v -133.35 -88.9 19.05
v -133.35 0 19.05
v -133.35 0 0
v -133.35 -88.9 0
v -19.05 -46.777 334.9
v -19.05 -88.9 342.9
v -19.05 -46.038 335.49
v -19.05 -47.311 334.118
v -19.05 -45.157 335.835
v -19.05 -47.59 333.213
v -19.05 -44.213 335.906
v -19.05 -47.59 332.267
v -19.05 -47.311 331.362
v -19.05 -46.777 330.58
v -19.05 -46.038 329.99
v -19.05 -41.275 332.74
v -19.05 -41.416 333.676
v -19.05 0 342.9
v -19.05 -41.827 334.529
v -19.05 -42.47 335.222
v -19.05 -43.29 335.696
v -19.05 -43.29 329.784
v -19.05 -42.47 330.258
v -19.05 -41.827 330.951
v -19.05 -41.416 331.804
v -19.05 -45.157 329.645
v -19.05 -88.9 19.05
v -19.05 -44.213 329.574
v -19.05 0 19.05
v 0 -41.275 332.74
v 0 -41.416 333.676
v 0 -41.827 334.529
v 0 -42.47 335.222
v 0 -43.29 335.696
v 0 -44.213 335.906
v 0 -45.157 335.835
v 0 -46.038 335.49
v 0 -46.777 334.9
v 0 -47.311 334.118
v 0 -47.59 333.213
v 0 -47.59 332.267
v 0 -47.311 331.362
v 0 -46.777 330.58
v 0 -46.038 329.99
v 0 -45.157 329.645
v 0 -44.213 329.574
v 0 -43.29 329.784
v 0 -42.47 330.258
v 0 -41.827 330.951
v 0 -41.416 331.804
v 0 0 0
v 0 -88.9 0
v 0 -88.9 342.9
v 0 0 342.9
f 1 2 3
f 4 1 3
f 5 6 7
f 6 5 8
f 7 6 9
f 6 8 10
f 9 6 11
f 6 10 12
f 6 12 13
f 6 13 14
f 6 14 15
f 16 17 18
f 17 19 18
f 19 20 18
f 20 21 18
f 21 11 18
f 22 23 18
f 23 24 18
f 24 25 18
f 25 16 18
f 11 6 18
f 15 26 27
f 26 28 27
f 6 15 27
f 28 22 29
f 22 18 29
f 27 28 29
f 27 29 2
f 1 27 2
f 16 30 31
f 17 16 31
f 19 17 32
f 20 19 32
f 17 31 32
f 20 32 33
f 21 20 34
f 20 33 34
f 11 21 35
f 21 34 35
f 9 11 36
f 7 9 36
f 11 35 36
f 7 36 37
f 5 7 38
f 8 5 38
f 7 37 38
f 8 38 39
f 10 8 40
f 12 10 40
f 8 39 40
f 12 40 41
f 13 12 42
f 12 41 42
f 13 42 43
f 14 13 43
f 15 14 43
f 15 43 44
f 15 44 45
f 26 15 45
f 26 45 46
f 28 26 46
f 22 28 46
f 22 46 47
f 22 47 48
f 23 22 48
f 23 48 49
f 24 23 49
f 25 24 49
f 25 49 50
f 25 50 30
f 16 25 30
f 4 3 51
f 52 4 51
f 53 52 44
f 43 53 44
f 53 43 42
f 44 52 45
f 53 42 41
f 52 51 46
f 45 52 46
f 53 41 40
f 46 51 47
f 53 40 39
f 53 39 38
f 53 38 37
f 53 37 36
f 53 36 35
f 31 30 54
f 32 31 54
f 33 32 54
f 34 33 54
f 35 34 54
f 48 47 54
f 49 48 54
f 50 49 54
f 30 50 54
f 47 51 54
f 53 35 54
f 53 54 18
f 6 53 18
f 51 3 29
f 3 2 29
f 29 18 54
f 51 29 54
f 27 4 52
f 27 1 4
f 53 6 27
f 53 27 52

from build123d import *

# Parameters (mm, degrees)
F1_DEPTH = 88.9
F3_D     = 6.35


with BuildPart() as f1:
    # F0 (on Front) → F1 (new body)
    with BuildSketch(Plane.XZ):
        Polygon((-133.35, 0), (0, 0), (0, 342.9), (-19.05, 342.9), (-19.05, 19.05), (-133.35, 19.05), align=None)
    extrude(amount=F1_DEPTH)

    # F3 (through all)
    with Locations(Plane(origin=(-19.05, 0, 0), x_dir=(0, -1, 0), z_dir=(-1, 0, 0))):
        with Locations((44.45, 332.74)):
            Hole(F3_D / 2)


solid = f1.part
